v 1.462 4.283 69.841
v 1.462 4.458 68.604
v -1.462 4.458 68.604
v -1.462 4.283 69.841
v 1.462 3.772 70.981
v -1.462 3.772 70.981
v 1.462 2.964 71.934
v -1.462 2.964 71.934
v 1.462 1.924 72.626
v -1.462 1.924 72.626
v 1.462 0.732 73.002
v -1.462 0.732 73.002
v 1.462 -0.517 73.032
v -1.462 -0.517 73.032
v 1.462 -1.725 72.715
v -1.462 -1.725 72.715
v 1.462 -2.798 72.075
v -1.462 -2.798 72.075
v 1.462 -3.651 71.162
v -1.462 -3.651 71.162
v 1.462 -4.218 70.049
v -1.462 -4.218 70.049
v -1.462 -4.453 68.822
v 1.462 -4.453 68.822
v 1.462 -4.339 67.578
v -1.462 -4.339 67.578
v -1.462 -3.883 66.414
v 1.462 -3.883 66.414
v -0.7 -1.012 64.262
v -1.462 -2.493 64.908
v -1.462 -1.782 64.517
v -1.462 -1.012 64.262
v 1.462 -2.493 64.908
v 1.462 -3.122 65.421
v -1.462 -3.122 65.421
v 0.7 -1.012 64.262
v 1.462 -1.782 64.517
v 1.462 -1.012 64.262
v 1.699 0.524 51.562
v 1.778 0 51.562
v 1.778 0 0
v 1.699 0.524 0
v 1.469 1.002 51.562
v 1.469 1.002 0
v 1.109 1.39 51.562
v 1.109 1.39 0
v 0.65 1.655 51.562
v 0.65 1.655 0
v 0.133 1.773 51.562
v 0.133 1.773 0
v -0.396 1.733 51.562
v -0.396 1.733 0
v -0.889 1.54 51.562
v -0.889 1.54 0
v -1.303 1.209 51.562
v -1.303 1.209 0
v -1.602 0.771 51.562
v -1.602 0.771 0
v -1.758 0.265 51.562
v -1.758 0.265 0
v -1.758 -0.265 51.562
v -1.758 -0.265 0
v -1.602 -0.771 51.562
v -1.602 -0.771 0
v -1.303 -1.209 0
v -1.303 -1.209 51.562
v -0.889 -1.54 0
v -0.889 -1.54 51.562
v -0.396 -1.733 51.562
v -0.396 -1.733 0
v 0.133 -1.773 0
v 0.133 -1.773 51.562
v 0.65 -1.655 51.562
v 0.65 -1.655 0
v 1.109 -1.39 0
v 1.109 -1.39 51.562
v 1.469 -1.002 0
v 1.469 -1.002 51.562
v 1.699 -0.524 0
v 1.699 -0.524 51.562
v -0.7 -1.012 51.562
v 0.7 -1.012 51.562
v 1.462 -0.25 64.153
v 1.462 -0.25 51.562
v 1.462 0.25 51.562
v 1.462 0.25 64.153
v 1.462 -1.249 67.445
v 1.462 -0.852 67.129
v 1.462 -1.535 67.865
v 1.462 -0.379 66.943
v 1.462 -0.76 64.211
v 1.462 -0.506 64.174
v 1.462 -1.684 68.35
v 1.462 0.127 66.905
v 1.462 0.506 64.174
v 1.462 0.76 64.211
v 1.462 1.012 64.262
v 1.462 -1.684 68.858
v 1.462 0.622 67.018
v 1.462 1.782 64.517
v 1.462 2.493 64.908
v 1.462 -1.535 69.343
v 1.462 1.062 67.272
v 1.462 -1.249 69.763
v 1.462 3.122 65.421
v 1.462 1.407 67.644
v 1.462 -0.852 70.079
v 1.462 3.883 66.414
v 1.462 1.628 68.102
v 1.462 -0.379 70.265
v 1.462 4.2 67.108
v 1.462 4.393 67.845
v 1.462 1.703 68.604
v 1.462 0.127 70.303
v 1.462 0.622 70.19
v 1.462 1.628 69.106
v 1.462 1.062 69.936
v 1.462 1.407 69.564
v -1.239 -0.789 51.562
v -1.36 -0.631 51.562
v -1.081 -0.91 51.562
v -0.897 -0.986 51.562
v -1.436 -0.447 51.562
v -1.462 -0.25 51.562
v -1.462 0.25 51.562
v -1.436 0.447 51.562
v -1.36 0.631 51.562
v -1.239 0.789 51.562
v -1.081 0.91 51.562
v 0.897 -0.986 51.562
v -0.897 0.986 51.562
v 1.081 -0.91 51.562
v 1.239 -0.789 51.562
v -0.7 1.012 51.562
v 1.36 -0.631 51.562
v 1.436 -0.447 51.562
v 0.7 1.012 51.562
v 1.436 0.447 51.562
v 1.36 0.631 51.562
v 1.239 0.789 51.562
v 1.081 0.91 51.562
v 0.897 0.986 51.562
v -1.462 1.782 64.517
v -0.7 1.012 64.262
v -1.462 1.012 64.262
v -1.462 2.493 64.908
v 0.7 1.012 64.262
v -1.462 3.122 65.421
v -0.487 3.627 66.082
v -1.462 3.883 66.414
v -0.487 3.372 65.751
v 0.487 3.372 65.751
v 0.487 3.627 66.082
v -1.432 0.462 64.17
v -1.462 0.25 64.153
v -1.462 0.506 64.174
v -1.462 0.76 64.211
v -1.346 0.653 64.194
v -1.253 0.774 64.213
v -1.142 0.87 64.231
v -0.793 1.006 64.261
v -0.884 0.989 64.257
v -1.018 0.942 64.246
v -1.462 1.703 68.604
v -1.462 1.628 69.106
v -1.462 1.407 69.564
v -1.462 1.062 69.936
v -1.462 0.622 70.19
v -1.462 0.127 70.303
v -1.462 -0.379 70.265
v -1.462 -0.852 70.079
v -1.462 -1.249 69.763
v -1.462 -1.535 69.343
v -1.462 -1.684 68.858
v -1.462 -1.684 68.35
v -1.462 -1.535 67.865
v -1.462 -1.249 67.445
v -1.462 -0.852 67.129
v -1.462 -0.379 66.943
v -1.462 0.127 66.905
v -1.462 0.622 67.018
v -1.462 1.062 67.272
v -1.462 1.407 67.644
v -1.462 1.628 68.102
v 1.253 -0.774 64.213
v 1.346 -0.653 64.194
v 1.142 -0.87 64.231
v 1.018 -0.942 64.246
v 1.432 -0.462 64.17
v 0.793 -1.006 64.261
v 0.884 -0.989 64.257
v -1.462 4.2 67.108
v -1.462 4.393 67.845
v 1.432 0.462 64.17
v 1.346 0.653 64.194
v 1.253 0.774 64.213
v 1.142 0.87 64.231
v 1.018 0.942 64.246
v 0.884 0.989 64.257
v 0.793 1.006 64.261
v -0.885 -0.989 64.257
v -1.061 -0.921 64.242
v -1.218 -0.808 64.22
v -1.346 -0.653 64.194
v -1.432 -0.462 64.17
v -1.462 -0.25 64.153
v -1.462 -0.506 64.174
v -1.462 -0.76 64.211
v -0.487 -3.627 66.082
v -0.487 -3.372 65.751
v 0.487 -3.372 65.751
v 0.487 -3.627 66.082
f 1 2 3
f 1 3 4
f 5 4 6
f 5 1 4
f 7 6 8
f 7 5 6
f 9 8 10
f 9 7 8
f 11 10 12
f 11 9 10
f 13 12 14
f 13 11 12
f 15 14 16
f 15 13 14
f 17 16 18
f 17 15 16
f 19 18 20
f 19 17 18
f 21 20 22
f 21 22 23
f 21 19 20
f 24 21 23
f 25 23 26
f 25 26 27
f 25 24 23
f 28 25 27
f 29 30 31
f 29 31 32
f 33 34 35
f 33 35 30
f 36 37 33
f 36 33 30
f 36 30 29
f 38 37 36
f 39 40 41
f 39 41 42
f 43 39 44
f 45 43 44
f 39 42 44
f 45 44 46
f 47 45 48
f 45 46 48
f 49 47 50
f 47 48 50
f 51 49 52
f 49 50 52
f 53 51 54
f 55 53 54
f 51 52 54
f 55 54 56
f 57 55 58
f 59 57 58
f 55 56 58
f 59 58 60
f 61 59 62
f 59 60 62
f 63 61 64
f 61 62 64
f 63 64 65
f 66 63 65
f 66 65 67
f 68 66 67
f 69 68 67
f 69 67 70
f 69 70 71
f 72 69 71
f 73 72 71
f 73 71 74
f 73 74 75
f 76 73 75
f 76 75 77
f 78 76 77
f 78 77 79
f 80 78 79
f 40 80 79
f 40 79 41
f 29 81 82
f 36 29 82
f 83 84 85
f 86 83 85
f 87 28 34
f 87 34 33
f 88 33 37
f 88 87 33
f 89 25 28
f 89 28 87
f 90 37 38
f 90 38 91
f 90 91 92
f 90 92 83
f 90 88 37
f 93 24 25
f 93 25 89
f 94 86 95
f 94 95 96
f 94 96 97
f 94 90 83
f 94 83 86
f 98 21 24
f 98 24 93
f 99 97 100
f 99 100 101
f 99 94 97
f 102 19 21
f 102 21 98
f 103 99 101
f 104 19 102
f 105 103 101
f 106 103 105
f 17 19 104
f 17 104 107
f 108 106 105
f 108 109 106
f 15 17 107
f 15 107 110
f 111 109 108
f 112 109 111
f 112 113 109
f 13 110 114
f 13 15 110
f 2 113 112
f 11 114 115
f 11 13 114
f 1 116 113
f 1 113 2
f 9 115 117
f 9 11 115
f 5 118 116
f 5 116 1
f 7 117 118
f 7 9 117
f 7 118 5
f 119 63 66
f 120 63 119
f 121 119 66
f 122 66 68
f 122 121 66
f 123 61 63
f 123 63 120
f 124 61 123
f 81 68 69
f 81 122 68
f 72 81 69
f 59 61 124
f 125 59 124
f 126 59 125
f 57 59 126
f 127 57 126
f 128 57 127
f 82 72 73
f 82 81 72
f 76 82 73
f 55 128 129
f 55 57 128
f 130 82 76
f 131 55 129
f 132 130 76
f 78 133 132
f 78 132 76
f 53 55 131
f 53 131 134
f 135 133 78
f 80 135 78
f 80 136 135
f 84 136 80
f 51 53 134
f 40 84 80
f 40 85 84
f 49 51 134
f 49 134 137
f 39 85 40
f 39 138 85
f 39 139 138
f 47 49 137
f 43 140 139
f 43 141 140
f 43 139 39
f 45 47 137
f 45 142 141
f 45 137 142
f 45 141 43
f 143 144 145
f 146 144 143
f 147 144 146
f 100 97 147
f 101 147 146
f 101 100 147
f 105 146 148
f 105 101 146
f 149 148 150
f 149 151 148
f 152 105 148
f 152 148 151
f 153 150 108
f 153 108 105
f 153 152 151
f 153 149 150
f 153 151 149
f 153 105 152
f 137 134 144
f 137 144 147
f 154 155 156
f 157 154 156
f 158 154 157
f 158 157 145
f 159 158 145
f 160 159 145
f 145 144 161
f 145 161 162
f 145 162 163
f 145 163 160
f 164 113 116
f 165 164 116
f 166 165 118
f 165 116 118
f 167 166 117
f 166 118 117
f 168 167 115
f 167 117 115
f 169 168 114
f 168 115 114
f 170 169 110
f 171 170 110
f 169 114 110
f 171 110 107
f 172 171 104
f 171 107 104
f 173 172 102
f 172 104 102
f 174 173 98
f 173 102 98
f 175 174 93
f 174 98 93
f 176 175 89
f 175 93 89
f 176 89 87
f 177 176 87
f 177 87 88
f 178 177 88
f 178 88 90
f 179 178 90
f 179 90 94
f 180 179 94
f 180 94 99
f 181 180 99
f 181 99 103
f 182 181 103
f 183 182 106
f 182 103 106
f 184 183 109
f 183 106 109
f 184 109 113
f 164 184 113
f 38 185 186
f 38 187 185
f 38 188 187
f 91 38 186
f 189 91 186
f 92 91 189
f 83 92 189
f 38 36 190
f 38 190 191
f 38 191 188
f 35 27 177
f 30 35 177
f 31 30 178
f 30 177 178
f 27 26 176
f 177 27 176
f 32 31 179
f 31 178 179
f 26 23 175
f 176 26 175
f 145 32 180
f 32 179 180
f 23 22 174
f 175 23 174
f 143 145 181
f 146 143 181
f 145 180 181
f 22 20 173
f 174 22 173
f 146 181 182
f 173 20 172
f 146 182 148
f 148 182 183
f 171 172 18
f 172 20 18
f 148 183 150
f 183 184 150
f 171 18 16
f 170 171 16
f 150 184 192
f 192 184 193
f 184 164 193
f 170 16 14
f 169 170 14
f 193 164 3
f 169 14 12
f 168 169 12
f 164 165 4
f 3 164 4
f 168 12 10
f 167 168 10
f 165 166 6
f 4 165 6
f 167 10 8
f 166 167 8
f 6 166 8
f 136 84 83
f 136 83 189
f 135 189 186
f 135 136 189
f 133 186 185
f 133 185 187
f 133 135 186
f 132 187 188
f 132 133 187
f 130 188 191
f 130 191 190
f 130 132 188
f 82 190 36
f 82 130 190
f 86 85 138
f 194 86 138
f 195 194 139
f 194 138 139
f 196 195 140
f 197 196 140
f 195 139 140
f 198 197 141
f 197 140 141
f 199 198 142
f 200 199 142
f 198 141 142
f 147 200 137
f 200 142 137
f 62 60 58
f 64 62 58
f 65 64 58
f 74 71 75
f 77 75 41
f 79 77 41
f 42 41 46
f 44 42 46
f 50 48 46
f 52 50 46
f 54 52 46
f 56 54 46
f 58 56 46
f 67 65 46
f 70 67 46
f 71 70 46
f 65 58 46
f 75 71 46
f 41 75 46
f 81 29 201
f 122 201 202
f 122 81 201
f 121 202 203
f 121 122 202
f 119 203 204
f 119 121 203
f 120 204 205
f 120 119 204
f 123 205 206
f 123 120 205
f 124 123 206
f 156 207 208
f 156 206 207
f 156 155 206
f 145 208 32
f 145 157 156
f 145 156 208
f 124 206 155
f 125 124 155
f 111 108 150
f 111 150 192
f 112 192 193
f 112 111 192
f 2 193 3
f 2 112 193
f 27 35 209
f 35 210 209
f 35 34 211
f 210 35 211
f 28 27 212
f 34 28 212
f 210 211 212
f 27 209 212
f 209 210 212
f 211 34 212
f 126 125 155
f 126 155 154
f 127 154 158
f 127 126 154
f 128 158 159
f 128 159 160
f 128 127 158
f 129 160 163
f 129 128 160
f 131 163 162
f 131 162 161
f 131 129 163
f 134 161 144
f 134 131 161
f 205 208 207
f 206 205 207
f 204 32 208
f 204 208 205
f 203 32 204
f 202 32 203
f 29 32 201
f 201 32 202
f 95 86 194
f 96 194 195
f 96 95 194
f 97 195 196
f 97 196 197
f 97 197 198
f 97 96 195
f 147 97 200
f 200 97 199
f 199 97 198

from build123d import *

# Parameters (mm, degrees)
F0_R         = 1.778
F1_DEPTH     = 51.562
F2_W         = 2.9239974657
F2_H         = 2.0237032442
F3_DEPTH     = 12.7
F4_R         = 1.7034886821
F5_DEPTH     = 2.92354
F6_T4_DEPTH  = 14.605
F6_S5_R      = 4.4583340214
F6_T6_DEPTH  = 9
F6_T10_DEPTH = 14.605
F6_S11_R     = 4.4583340214
F6_T12_DEPTH = 9
F6_T16_DEPTH = 14.605
F6_S17_R     = 4.4583340214
F6_T18_DEPTH = 9
F6_T22_DEPTH = 14.605
F6_S23_R     = 4.4583340214
F6_T24_DEPTH = 9


# Not quite as in the source:
# - a fillet or chamfer that OpenCascade refuses, or shapes differently, is made with other operations: its cross-section is extruded or revolved along the edge and cut away or added


with BuildPart() as f1:
    # F0 (on Top) → F1 (new body)
    with BuildSketch(Plane.XY):
        Circle(F0_R)
    extrude(amount=F1_DEPTH)

    # F2 (on face) → F3 (join)
    with BuildSketch(Plane.XY.offset(51.562)):
        Rectangle(F2_W, F2_H)
    extrude(amount=F3_DEPTH)

    # F4 (on face) → F5 (join)
    with BuildSketch(Plane.YZ.offset(1.4619987328)):
        with BuildLine():
            ThreePointArc((3.8834322811, 66.4140847097), (4.3122140778, 67.4719359292), (4.4583340214, 68.6039924622))
            ThreePointArc((4.4583340214, 68.6039924622), (-1.132056533, 72.91620654), (-3.8834322811, 66.4140847097))
            add(Edge.make_bspline(
                [(-3.1221140478, 65.4213605138), (-3.3692442223, 65.7498568477), (-3.6264069605, 66.0819292585), (-3.8834322811, 66.4140847097)],
                knots=[0.8083200784, 0.8083200784, 0.8083200784, 0.8083200784, 1, 1, 1, 1], degree=3))
            ThreePointArc((-3.1221140478, 65.4213605138), (-2.1467294288, 64.6965258908), (-1.0118516221, 64.262))
            Line((-1.0118516221, 64.262), (1.0118516221, 64.262))
            ThreePointArc((1.0118516221, 64.262), (2.1467294288, 64.6965258908), (3.1221140478, 65.4213605138))
            add(Edge.make_bspline(
                [(3.1221140478, 65.4213605138), (3.3692442223, 65.7498568477), (3.6264069605, 66.0819292585), (3.8834322811, 66.4140847097)],
                knots=[0.8083200784, 0.8083200784, 0.8083200784, 0.8083200784, 1, 1, 1, 1], degree=3))
        make_face()
        with Locations((0, 68.6039924622)):
            Circle(F4_R, mode=Mode.SUBTRACT)
    extrude(amount=-F5_DEPTH)

    # F6: fillet of radius 0.762 on 4 edges, made by hand


with BuildPart() as f6_tool2:
    # F6_s3 → F6_t4 (new body)
    with BuildSketch(Plane.XY.offset(51.562)):
        with BuildLine():
            ThreePointArc((1.4619987328, -0.2498516221), (1.2388141001, -0.7886669894), (0.6999987328, -1.0118516221))
            Line((0.6999987328, -1.0118516221), (1.4619987328, -1.0118516221))
            Line((1.4619987328, -1.0118516221), (1.4619987328, -0.2498516221))
        make_face()
    extrude(amount=F6_T4_DEPTH)

    # F6_s5 → F6_t6 (cut, symmetric)
    with BuildSketch(Plane.YZ.offset(1.1)):
        with Locations((0, 68.6039924622)):
            Circle(F6_S5_R)
    extrude(amount=F6_T6_DEPTH, both=True, mode=Mode.SUBTRACT)


with BuildPart() as f1_1:
    add(f1.part)

    # F6_t1: cut F6_tool2
    add(f6_tool2.part, mode=Mode.SUBTRACT)


with BuildPart() as f6_tool8:
    # F6_s9 → F6_t10 (new body)
    with BuildSketch(Plane.XY.offset(51.562)):
        with BuildLine():
            ThreePointArc((-1.4619987328, 0.2498516221), (-1.2388141001, 0.7886669894), (-0.6999987328, 1.0118516221))
            Line((-0.6999987328, 1.0118516221), (-1.4619987328, 1.0118516221))
            Line((-1.4619987328, 1.0118516221), (-1.4619987328, 0.2498516221))
        make_face()
    extrude(amount=F6_T10_DEPTH)

    # F6_s11 → F6_t12 (cut, symmetric)
    with BuildSketch(Plane.YZ.offset(-1.1)):
        with Locations((0, 68.6039924622)):
            Circle(F6_S11_R)
    extrude(amount=F6_T12_DEPTH, both=True, mode=Mode.SUBTRACT)


with BuildPart() as f1_2:
    add(f1_1.part)

    # F6_t7: cut F6_tool8
    add(f6_tool8.part, mode=Mode.SUBTRACT)


with BuildPart() as f6_tool14:
    # F6_s15 → F6_t16 (new body)
    with BuildSketch(Plane.XY.offset(51.562)):
        with BuildLine():
            ThreePointArc((1.4619987328, 0.2498516221), (1.2388141001, 0.7886669894), (0.6999987328, 1.0118516221))
            Line((0.6999987328, 1.0118516221), (1.4619987328, 1.0118516221))
            Line((1.4619987328, 1.0118516221), (1.4619987328, 0.2498516221))
        make_face()
    extrude(amount=F6_T16_DEPTH)

    # F6_s17 → F6_t18 (cut, symmetric)
    with BuildSketch(Plane.YZ.offset(1.1)):
        with Locations((0, 68.6039924622)):
            Circle(F6_S17_R)
    extrude(amount=F6_T18_DEPTH, both=True, mode=Mode.SUBTRACT)


with BuildPart() as f1_3:
    add(f1_2.part)

    # F6_t13: cut F6_tool14
    add(f6_tool14.part, mode=Mode.SUBTRACT)


with BuildPart() as f6_tool20:
    # F6_s21 → F6_t22 (new body)
    with BuildSketch(Plane.XY.offset(51.562)):
        with BuildLine():
            ThreePointArc((-0.6999987328, -1.0118516221), (-1.2388141001, -0.7886669894), (-1.4619987328, -0.2498516221))
            Line((-1.4619987328, -0.2498516221), (-1.4619987328, -1.0118516221))
            Line((-1.4619987328, -1.0118516221), (-0.6999987328, -1.0118516221))
        make_face()
    extrude(amount=F6_T22_DEPTH)

    # F6_s23 → F6_t24 (cut, symmetric)
    with BuildSketch(Plane.YZ.offset(-1.1)):
        with Locations((0, 68.6039924622)):
            Circle(F6_S23_R)
    extrude(amount=F6_T24_DEPTH, both=True, mode=Mode.SUBTRACT)


with BuildPart() as f1_4:
    add(f1_3.part)

    # F6_t19: cut F6_tool20
    add(f6_tool20.part, mode=Mode.SUBTRACT)


solid = f1_4.part
